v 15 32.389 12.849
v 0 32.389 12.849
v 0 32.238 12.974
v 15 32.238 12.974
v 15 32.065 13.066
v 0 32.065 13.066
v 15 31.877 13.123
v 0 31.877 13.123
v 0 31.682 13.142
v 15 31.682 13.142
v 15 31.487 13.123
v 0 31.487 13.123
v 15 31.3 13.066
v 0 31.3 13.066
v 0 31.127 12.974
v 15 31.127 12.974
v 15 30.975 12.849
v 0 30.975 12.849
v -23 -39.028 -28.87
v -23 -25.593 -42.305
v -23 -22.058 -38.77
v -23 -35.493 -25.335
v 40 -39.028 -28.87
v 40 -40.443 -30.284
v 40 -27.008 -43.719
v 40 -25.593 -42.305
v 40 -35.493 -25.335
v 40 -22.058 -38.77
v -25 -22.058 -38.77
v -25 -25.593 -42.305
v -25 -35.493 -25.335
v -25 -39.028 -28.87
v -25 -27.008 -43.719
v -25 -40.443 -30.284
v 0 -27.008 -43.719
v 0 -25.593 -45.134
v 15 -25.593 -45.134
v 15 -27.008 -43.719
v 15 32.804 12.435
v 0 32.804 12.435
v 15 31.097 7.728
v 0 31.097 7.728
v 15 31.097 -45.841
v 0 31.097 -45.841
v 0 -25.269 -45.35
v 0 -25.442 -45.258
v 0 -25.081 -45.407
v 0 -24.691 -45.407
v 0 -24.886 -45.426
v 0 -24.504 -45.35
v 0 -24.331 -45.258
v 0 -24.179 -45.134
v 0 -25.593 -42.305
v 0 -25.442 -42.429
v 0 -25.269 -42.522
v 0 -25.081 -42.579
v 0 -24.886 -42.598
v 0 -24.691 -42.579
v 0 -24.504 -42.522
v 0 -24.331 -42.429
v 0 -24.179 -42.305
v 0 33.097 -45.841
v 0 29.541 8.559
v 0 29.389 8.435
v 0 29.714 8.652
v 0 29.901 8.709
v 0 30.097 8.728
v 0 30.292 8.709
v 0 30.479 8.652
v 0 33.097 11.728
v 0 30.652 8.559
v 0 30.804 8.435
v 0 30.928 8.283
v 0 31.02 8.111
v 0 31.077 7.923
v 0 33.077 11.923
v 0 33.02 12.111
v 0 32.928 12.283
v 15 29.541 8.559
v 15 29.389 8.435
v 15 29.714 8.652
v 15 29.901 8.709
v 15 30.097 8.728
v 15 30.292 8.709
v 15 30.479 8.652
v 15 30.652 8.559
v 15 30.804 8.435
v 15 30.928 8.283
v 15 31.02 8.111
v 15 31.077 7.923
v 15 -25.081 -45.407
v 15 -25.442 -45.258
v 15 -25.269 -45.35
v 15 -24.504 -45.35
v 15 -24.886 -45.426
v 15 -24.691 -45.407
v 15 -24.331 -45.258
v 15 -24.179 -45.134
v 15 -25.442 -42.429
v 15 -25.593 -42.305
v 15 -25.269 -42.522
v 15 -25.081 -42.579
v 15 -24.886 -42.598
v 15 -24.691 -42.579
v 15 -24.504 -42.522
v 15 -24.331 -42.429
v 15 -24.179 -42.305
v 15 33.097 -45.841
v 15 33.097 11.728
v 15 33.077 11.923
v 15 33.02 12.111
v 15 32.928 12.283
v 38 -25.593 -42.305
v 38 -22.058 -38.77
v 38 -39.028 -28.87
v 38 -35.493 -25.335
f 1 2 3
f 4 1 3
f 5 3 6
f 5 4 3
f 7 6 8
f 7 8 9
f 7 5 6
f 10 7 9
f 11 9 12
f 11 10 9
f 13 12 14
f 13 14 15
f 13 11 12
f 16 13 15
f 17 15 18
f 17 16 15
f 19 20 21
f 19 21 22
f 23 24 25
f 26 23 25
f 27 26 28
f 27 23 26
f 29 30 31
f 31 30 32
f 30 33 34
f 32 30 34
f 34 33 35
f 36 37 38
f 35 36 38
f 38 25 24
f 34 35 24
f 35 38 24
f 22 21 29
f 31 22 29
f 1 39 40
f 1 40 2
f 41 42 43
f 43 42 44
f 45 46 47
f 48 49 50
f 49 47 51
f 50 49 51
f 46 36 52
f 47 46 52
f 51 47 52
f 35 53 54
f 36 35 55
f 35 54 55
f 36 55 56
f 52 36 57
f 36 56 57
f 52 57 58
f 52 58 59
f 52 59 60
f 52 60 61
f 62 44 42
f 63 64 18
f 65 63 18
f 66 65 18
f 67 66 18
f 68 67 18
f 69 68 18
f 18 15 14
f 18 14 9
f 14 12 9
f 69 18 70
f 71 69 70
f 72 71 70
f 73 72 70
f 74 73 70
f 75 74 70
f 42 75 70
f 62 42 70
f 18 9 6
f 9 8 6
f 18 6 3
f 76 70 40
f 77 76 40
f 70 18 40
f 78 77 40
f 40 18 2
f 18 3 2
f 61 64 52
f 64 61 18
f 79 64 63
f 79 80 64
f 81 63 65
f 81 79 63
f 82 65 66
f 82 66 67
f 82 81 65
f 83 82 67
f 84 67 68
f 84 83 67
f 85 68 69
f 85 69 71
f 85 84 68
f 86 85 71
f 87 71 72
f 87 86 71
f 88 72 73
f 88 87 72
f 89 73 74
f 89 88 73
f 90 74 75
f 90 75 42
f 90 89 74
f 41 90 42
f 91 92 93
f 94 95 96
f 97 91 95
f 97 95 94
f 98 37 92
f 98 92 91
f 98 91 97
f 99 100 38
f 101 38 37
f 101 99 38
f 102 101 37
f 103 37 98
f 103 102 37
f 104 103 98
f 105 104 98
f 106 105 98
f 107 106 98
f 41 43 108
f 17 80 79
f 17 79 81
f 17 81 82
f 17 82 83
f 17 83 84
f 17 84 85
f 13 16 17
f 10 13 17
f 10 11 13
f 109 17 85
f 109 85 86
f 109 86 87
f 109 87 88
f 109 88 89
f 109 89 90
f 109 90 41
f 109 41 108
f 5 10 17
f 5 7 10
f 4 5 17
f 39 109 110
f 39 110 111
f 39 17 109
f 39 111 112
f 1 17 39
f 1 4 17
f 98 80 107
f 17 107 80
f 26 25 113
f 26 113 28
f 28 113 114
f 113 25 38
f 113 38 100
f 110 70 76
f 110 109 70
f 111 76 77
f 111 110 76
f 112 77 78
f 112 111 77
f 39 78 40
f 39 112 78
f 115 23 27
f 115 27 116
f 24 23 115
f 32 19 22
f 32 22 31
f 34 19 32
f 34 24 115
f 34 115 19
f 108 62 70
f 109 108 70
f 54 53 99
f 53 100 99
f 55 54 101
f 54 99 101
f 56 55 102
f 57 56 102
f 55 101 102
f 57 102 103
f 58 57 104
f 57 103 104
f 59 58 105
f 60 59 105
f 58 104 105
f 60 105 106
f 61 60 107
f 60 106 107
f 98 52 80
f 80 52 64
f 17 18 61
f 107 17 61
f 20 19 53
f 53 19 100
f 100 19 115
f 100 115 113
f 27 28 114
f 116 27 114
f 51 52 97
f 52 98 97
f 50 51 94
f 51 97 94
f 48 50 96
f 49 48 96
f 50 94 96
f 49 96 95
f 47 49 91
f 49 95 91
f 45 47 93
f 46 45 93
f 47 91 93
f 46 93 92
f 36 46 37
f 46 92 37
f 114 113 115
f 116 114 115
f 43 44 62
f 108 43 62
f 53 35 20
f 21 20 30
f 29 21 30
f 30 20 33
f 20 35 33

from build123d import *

# Parameters (mm, degrees)
F1_DEPTH  = 15
F2_R      = 1
F3_R      = 1
F4_R      = 1
F6_DEPTH  = 25
F8_DEPTH  = 25
F9_W      = 2
F9_H      = 19
F10_DEPTH = 5


with BuildPart() as f1:
    # F0 (on Right) → F1 (new body)
    with BuildSketch(Plane.YZ):
        Polygon((-24.8861957348, -43.0121933088), (-39.0283313585, -28.8700576851), (-40.4425449209, -30.2842712475), (-24.8861957348, -45.8406204336), (31.0965603225, 10.1421356237), (31.0965603225, -45.8406204336), (33.0965603225, -45.8406204336), (33.0965603225, 12.1421356237), (31.6823467601, 13.5563491861), align=None)
    extrude(amount=F1_DEPTH)

    # F2
    f2_edges = [f1.edges().sort_by_distance(p)[0] for p in [
        (7.5, -24.886196, -43.012193),
    ]]
    fillet(f2_edges, radius=F2_R)

    # F3
    f3_edges = [f1.edges().sort_by_distance(p)[0] for p in [
        (7.5, 31.09656, 10.142136),
    ]]
    fillet(f3_edges, radius=F3_R)

    # F4
    f4_edges = [f1.edges().sort_by_distance(p)[0] for p in [
        (7.5, -24.886196, -45.84062),
        (7.5, 31.682347, 13.556349),
        (7.5, 33.09656, 12.142136),
    ]]
    fillet(f4_edges, radius=F4_R)

    # F5 (on face) → F6 (join)
    with BuildSketch(Plane.YZ.offset(15)):
        Polygon((-25.593302516, -42.3050865276), (-39.0283313585, -28.8700576851), (-40.4425449209, -30.2842712475), (-27.0075160784, -43.71930009), align=None)
    extrude(amount=F6_DEPTH)

    # F7 (on face) → F8 (join)
    with BuildSketch(Plane(origin=(0, 0, 0), x_dir=(0, -1, 0), z_dir=(-1, 0, 0))):
        Polygon((40.4425449209, -30.2842712475), (39.0283313585, -28.8700576851), (25.593302516, -42.3050865276), (27.0075160784, -43.71930009), align=None)
    extrude(amount=F8_DEPTH)

    # F9 (on face) → F10 (join)
    with BuildSketch(Plane(origin=(0, -33.9491945218, -33.9491945218), x_dir=(-1, 0, 0), z_dir=(0, 0.7071067812, 0.7071067812))):
        with Locations((24, -2.3170158004)):
            Rectangle(F9_W, F9_H)
        with Locations((-39, -2.3170158004)):
            Rectangle(F9_W, F9_H)
    extrude(amount=F10_DEPTH)


solid = f1.part
